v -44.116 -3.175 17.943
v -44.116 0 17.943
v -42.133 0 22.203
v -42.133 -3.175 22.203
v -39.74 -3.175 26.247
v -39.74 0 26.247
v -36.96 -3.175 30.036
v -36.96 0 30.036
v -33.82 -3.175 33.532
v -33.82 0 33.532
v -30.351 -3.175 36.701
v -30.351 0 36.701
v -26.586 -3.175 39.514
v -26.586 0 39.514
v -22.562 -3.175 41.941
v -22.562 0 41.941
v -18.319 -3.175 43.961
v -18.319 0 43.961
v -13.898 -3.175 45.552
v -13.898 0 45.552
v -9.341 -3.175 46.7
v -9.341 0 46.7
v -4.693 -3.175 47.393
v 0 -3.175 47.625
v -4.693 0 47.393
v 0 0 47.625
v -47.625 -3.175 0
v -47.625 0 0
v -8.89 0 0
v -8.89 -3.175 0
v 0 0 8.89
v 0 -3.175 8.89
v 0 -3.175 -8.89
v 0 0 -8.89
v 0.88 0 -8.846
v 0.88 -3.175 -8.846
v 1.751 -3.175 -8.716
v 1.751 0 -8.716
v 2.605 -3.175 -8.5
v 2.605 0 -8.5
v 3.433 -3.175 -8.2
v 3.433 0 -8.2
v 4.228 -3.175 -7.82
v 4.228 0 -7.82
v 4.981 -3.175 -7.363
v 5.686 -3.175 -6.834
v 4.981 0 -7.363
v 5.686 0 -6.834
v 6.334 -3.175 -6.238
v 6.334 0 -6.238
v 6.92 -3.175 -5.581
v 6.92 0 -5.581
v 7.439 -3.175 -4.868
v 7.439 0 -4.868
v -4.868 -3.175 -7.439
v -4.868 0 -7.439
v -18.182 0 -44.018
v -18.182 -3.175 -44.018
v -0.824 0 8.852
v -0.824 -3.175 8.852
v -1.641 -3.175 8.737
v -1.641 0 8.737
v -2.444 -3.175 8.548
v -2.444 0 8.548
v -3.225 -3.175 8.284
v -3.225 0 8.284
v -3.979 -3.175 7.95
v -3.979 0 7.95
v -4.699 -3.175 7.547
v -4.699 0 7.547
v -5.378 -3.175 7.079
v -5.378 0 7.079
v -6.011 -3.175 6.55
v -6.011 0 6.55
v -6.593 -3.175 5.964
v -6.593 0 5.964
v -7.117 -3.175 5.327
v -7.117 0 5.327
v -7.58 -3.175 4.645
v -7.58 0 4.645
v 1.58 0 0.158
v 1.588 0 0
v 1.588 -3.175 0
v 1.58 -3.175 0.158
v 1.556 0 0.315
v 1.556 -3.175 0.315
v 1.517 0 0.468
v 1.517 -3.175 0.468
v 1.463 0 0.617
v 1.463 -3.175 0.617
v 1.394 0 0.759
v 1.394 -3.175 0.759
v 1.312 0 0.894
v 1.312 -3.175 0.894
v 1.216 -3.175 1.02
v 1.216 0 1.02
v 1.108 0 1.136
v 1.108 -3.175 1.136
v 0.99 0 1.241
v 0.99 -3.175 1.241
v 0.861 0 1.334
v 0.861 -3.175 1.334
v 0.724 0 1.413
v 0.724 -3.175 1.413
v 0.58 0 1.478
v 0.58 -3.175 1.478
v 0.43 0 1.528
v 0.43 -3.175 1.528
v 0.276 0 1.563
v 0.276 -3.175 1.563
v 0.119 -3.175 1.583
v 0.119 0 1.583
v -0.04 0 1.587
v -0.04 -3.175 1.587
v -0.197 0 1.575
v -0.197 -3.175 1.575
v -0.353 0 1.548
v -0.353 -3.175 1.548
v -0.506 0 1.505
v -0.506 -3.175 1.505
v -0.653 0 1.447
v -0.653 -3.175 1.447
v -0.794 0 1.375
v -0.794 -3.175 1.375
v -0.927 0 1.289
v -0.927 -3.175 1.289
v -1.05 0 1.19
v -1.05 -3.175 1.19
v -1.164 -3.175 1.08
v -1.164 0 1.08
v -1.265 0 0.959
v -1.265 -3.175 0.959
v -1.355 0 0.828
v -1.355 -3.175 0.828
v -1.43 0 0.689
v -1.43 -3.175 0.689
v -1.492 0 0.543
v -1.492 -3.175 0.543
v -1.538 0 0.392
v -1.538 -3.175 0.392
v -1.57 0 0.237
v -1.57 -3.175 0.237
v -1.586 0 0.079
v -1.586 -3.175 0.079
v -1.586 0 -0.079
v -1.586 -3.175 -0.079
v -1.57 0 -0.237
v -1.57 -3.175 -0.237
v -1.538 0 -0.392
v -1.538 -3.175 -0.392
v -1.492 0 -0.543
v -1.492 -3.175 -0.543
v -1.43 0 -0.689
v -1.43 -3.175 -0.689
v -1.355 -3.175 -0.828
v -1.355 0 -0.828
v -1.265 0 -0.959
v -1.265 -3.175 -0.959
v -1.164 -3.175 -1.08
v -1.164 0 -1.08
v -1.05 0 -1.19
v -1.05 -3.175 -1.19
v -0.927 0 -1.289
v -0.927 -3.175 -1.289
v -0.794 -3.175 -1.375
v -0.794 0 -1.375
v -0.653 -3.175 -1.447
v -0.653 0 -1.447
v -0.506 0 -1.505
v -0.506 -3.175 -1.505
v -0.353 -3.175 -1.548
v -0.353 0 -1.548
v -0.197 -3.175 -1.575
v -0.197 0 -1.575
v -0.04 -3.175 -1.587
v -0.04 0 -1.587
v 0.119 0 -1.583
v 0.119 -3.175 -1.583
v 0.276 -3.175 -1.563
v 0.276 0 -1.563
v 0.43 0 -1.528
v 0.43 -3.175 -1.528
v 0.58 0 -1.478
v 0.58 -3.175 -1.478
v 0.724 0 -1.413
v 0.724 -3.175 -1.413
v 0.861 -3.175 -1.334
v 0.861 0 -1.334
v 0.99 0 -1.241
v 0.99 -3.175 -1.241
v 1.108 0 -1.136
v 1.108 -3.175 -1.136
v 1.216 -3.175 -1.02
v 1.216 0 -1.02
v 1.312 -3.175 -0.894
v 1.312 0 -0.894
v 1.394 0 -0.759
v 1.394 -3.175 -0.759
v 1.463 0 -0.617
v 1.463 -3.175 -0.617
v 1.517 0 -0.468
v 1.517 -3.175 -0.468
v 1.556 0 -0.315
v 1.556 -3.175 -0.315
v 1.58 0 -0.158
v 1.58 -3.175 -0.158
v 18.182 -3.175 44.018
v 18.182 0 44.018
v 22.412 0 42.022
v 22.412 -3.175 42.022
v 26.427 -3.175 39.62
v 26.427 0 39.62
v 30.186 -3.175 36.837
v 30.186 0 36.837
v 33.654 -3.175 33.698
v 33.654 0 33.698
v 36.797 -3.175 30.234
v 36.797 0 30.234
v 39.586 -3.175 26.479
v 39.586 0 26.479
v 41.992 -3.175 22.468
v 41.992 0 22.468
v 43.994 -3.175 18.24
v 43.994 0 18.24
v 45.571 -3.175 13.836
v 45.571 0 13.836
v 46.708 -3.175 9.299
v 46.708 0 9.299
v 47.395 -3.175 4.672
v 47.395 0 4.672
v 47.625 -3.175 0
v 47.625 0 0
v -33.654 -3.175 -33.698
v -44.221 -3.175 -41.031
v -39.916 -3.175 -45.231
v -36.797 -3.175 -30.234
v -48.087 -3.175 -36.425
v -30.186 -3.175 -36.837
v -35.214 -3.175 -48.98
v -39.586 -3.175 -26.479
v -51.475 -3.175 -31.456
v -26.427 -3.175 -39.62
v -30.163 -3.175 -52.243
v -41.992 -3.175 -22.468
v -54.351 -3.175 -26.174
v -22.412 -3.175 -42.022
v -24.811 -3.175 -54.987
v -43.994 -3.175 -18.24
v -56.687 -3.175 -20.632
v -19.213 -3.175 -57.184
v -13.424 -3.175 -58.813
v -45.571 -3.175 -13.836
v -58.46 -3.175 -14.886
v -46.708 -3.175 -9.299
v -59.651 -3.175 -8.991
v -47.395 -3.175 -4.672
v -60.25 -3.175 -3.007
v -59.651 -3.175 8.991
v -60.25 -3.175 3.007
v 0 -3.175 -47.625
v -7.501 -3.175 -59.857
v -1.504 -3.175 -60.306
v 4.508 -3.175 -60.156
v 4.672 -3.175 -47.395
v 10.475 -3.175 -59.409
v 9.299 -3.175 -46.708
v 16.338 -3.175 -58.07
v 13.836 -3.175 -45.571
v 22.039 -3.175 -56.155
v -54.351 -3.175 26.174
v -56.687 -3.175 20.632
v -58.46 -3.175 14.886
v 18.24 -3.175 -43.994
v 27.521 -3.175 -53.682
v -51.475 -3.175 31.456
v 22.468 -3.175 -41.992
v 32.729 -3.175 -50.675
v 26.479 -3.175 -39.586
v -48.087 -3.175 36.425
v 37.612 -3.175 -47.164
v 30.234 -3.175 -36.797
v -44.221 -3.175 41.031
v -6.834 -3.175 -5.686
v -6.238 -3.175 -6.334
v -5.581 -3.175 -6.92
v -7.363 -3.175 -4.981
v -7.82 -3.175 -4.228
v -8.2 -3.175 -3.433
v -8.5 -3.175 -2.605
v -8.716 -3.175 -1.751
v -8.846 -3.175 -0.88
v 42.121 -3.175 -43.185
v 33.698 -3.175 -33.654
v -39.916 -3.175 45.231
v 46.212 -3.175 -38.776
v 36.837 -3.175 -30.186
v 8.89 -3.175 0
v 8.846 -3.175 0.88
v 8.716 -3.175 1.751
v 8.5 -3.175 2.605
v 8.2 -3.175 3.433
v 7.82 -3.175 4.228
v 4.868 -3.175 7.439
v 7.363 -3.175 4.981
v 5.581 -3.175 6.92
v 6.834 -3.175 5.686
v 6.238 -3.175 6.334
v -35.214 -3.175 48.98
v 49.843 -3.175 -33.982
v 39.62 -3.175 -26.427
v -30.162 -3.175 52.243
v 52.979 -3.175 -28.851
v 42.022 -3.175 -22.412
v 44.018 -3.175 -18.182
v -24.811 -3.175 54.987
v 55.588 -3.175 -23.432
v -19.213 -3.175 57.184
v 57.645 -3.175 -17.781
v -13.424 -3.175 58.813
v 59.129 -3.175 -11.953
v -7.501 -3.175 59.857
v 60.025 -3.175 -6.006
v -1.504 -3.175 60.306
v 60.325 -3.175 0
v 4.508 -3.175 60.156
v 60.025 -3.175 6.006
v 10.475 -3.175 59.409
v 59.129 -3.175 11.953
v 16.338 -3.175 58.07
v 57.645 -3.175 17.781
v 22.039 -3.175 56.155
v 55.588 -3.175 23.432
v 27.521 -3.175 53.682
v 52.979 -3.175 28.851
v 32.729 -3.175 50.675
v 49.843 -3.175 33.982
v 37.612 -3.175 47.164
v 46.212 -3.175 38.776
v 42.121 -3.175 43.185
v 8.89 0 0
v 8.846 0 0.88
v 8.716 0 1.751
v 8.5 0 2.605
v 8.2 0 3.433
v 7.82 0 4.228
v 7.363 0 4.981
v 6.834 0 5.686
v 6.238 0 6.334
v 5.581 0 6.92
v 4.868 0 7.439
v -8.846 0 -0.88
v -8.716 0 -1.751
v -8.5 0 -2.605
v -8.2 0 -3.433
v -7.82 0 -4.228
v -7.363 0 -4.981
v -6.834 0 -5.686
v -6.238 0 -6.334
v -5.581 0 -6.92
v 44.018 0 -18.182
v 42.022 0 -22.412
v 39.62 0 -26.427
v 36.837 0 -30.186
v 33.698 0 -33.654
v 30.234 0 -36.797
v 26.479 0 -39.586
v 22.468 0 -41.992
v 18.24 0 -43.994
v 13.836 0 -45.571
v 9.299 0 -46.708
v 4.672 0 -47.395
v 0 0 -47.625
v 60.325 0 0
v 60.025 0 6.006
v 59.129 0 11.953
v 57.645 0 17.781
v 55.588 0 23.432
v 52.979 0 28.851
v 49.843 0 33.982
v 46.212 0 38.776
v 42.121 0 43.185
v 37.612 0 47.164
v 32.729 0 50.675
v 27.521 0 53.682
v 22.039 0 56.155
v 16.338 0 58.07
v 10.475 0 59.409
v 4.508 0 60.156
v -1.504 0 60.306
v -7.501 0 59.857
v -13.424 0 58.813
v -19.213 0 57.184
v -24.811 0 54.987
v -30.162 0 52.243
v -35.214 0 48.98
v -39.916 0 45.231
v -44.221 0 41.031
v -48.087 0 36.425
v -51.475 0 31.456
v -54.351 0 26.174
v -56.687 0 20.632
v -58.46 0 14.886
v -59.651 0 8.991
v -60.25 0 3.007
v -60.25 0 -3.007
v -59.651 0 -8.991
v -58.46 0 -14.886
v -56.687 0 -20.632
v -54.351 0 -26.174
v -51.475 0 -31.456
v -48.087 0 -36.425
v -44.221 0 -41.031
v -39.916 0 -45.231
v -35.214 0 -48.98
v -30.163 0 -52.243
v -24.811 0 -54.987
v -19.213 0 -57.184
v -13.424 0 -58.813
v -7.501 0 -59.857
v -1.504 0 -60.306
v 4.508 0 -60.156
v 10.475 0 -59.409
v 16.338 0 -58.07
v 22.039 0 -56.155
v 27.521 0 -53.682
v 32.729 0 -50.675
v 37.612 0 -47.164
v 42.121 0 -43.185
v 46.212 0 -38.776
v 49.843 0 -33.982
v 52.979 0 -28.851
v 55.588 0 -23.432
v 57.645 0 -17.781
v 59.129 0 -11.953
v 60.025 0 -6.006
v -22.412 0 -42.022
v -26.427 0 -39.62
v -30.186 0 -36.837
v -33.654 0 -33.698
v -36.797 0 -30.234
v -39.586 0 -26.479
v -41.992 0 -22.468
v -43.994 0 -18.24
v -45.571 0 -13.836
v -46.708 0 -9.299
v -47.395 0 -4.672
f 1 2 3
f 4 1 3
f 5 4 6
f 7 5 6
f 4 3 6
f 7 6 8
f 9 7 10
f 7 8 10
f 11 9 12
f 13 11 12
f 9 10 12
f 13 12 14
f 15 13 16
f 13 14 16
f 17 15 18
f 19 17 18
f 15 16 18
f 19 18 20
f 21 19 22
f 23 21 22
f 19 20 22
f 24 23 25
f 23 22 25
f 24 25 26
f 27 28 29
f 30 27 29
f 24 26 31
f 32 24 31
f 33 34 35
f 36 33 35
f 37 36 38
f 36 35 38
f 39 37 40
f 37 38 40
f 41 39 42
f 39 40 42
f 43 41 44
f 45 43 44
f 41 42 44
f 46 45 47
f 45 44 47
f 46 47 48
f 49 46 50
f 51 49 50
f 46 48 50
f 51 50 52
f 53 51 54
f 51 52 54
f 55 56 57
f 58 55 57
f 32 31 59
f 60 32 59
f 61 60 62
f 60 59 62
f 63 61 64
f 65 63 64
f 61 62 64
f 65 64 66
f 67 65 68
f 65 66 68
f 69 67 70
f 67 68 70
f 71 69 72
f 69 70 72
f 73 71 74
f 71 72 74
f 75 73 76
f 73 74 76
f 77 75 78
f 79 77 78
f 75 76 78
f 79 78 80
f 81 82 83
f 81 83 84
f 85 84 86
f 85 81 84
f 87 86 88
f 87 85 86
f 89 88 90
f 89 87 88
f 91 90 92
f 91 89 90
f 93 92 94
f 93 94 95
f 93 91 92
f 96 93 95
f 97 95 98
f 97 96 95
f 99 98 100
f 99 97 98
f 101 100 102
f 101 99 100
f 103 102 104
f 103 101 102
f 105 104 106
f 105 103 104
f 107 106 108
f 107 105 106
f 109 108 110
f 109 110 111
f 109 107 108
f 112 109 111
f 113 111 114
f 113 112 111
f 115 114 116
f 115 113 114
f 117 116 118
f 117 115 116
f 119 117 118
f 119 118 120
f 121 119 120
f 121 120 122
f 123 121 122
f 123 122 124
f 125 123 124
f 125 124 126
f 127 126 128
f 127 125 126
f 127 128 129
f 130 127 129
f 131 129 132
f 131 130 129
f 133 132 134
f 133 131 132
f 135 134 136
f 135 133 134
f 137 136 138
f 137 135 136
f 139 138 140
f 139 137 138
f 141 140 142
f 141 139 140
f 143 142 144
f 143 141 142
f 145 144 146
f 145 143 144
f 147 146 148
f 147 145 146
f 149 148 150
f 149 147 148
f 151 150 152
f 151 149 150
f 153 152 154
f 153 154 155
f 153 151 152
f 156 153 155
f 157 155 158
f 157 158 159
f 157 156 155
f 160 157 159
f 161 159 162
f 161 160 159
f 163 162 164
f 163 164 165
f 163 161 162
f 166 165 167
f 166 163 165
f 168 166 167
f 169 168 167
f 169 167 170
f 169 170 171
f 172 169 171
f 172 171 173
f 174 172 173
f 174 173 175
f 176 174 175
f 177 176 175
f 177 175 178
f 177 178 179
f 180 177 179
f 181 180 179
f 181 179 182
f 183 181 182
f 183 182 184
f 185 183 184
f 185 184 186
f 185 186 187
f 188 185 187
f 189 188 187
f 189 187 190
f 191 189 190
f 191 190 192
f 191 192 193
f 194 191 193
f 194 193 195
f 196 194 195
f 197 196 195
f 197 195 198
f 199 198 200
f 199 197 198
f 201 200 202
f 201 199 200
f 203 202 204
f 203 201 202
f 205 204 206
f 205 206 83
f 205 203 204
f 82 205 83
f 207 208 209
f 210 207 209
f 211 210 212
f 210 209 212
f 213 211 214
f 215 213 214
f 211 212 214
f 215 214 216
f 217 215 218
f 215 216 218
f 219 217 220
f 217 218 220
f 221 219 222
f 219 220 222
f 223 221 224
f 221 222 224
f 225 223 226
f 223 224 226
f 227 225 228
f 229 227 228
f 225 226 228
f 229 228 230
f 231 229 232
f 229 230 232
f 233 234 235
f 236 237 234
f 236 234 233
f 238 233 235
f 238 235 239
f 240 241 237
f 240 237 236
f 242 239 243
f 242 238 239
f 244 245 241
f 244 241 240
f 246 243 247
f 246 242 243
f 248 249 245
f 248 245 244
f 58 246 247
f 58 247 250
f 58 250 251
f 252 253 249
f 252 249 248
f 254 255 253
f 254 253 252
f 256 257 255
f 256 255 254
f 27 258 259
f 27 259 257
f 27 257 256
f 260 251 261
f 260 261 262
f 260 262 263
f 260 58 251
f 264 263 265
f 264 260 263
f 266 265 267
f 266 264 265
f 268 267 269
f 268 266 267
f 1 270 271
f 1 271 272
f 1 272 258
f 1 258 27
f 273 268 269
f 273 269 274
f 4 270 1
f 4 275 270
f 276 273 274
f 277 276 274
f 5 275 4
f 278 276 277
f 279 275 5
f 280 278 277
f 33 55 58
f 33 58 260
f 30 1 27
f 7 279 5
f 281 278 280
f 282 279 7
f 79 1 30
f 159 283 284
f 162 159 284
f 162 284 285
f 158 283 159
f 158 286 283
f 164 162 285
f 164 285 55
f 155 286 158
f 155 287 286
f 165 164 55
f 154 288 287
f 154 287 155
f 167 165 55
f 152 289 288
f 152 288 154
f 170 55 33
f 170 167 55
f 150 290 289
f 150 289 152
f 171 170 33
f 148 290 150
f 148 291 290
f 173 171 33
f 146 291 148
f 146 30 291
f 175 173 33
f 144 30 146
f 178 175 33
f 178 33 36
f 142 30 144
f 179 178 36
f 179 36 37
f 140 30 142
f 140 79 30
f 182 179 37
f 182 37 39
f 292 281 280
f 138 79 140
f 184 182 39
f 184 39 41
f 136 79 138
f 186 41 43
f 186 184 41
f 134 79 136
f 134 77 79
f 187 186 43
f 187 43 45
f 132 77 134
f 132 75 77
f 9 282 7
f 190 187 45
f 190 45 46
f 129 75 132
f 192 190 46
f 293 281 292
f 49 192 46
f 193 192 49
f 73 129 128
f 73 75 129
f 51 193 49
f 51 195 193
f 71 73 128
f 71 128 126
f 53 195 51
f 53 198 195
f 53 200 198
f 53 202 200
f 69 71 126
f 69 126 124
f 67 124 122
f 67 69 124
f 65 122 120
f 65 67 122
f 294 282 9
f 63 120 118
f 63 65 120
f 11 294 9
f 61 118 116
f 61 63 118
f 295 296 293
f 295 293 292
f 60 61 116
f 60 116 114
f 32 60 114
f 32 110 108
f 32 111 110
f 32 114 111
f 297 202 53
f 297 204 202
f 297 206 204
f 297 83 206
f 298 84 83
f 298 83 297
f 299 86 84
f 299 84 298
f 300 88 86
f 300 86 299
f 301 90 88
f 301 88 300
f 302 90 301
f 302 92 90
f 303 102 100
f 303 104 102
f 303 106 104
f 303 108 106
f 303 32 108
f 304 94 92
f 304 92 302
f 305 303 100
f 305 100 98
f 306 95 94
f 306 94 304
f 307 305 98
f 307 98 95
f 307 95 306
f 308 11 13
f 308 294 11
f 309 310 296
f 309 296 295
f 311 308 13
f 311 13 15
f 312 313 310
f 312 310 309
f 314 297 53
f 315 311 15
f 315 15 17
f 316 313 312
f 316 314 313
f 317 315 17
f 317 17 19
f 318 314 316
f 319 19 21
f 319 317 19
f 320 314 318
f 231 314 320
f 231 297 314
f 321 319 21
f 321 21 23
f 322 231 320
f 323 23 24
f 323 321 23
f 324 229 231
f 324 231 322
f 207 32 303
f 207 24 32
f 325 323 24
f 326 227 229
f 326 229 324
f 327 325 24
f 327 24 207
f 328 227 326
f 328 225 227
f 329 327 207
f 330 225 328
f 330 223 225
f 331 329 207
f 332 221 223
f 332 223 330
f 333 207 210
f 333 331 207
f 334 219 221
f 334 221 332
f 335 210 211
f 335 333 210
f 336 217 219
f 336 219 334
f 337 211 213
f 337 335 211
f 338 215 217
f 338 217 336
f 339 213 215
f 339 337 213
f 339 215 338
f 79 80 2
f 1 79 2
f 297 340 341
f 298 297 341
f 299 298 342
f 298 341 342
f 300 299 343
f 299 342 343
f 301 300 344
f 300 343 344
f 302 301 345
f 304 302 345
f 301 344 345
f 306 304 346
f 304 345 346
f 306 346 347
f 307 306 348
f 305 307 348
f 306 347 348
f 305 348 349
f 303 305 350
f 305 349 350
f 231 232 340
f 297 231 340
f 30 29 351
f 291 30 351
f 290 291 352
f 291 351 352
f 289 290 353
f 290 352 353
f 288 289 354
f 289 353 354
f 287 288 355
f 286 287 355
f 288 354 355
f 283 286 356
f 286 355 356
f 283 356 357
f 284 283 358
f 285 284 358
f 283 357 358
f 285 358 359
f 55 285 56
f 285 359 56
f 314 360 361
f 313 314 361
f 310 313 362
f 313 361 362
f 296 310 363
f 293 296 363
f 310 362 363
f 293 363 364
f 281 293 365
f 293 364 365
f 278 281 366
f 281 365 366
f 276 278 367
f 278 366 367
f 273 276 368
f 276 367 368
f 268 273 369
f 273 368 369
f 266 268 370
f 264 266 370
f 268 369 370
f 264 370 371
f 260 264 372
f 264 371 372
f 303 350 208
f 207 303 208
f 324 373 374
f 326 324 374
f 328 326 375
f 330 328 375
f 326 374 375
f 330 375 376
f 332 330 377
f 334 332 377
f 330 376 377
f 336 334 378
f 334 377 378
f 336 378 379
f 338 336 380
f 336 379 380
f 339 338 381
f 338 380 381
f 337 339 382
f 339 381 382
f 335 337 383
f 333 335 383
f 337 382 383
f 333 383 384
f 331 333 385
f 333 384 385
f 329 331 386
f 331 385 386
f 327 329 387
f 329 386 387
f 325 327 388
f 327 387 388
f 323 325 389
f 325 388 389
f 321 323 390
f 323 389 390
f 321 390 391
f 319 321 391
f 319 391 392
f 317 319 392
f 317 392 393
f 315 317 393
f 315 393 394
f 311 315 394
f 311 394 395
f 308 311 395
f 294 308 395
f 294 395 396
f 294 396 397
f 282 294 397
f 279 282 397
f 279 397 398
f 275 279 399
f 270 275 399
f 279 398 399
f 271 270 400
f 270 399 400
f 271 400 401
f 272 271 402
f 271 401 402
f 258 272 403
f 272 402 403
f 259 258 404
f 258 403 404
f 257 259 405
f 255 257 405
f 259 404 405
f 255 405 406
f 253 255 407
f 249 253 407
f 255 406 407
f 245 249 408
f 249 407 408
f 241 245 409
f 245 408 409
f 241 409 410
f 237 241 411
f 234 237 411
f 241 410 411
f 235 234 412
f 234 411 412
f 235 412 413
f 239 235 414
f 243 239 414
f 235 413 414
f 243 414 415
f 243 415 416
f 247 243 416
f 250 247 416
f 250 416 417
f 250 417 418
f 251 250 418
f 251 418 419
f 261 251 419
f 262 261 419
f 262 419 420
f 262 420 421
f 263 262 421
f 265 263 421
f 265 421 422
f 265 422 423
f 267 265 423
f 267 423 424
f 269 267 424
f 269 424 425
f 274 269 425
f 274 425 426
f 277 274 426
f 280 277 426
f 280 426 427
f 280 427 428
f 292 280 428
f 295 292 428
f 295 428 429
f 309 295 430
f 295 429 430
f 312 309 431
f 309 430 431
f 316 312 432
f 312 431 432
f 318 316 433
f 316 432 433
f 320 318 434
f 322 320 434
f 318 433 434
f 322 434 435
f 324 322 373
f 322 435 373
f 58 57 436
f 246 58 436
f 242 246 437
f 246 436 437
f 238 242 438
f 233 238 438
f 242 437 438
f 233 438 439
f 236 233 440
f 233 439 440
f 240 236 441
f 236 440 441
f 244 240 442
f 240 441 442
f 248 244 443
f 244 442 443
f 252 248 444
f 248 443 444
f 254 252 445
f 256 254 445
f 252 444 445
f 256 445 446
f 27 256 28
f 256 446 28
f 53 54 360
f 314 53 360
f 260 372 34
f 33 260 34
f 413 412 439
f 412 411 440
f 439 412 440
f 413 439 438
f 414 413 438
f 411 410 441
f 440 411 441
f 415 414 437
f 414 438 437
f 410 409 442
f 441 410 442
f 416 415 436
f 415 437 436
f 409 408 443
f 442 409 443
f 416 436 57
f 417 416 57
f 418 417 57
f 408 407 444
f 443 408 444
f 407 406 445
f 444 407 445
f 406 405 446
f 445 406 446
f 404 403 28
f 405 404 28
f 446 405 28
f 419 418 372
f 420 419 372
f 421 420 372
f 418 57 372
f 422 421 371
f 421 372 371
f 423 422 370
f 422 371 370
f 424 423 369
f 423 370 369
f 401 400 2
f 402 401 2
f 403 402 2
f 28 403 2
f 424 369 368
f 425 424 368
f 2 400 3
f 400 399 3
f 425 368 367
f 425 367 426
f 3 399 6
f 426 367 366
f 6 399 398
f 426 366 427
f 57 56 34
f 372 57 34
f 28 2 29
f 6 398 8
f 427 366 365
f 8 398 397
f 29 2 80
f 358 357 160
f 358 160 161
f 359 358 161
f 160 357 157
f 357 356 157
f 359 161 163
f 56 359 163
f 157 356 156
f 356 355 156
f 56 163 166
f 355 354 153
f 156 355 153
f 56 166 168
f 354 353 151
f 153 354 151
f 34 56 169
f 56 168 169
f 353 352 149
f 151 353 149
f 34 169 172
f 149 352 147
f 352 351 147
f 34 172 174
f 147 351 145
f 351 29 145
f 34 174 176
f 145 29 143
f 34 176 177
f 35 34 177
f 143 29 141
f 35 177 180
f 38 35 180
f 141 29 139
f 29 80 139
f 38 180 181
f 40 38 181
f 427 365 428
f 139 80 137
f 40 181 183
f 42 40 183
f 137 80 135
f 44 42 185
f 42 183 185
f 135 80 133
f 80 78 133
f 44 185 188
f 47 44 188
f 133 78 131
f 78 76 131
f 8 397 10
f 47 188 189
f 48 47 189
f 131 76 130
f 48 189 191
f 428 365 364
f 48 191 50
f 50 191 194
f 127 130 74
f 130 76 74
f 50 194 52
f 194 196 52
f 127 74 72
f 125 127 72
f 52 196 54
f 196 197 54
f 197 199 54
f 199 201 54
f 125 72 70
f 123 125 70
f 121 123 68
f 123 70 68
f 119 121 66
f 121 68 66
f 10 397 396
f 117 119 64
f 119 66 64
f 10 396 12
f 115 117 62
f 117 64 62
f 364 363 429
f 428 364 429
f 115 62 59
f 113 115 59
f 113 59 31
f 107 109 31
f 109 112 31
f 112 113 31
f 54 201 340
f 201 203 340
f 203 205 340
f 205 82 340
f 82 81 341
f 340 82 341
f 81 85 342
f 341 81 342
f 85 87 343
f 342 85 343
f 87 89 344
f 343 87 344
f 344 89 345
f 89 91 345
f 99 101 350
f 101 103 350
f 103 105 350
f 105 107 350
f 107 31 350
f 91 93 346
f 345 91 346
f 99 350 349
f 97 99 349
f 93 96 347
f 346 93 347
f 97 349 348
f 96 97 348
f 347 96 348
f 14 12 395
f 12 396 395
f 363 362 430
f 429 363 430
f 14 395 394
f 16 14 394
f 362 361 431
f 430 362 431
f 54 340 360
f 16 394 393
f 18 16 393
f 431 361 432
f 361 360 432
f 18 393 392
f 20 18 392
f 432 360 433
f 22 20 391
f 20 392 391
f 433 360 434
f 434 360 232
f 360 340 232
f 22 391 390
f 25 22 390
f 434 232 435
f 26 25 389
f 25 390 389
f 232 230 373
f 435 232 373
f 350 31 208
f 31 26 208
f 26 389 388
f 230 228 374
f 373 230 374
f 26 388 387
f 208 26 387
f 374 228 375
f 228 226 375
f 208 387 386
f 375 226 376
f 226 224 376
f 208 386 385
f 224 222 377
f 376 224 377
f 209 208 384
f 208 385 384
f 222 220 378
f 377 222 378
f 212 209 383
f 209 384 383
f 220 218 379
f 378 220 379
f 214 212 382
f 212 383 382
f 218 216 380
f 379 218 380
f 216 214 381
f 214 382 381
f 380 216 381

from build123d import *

# Parameters (mm, degrees)
F0_R     = 60.325
F0_R_2   = 1.5875
F1_DEPTH = 3.175


with BuildPart() as f1:
    # F0 (on Front) → F1 (new body)
    with BuildSketch(Plane.XZ):
        Circle(F0_R)
        with BuildLine():
            ThreePointArc((-18.181951, -44.017693), (-39.585705, -26.478531), (-47.625, 0))
            Line((-47.625, 0), (-8.89, 0))
            ThreePointArc((-8.89, 0), (-7.82019, -4.228088), (-4.868239, -7.438571))
            Line((-4.868239, -7.438571), (-18.181951, -44.017693))
        make_face(mode=Mode.SUBTRACT)
        with BuildLine():
            ThreePointArc((0, -8.89), (4.228088, -7.82019), (7.438571, -4.868239))
            Line((7.438571, -4.868239), (44.017693, -18.181951))
            ThreePointArc((44.017693, -18.181951), (26.478531, -39.585705), (0, -47.625))
            Line((0, -47.625), (0, -8.89))
        make_face(mode=Mode.SUBTRACT)
        with BuildLine():
            Line((0, 47.625), (0, 8.89))
            ThreePointArc((0, 8.89), (-4.343939, 7.756436), (-7.580086, 4.644825))
            Line((-7.580086, 4.644825), (-44.11575, 17.94272))
            ThreePointArc((-44.11575, 17.94272), (-26.585885, 39.513685), (0, 47.625))
        make_face(mode=Mode.SUBTRACT)
        Circle(F0_R_2, mode=Mode.SUBTRACT)
        with BuildLine():
            ThreePointArc((8.89, 0), (7.82019, 4.228088), (4.868239, 7.438571))
            Line((4.868239, 7.438571), (18.181951, 44.017693))
            ThreePointArc((18.181951, 44.017693), (39.585705, 26.478531), (47.625, 0))
            Line((47.625, 0), (8.89, 0))
        make_face(mode=Mode.SUBTRACT)
    extrude(amount=F1_DEPTH)


solid = f1.part
